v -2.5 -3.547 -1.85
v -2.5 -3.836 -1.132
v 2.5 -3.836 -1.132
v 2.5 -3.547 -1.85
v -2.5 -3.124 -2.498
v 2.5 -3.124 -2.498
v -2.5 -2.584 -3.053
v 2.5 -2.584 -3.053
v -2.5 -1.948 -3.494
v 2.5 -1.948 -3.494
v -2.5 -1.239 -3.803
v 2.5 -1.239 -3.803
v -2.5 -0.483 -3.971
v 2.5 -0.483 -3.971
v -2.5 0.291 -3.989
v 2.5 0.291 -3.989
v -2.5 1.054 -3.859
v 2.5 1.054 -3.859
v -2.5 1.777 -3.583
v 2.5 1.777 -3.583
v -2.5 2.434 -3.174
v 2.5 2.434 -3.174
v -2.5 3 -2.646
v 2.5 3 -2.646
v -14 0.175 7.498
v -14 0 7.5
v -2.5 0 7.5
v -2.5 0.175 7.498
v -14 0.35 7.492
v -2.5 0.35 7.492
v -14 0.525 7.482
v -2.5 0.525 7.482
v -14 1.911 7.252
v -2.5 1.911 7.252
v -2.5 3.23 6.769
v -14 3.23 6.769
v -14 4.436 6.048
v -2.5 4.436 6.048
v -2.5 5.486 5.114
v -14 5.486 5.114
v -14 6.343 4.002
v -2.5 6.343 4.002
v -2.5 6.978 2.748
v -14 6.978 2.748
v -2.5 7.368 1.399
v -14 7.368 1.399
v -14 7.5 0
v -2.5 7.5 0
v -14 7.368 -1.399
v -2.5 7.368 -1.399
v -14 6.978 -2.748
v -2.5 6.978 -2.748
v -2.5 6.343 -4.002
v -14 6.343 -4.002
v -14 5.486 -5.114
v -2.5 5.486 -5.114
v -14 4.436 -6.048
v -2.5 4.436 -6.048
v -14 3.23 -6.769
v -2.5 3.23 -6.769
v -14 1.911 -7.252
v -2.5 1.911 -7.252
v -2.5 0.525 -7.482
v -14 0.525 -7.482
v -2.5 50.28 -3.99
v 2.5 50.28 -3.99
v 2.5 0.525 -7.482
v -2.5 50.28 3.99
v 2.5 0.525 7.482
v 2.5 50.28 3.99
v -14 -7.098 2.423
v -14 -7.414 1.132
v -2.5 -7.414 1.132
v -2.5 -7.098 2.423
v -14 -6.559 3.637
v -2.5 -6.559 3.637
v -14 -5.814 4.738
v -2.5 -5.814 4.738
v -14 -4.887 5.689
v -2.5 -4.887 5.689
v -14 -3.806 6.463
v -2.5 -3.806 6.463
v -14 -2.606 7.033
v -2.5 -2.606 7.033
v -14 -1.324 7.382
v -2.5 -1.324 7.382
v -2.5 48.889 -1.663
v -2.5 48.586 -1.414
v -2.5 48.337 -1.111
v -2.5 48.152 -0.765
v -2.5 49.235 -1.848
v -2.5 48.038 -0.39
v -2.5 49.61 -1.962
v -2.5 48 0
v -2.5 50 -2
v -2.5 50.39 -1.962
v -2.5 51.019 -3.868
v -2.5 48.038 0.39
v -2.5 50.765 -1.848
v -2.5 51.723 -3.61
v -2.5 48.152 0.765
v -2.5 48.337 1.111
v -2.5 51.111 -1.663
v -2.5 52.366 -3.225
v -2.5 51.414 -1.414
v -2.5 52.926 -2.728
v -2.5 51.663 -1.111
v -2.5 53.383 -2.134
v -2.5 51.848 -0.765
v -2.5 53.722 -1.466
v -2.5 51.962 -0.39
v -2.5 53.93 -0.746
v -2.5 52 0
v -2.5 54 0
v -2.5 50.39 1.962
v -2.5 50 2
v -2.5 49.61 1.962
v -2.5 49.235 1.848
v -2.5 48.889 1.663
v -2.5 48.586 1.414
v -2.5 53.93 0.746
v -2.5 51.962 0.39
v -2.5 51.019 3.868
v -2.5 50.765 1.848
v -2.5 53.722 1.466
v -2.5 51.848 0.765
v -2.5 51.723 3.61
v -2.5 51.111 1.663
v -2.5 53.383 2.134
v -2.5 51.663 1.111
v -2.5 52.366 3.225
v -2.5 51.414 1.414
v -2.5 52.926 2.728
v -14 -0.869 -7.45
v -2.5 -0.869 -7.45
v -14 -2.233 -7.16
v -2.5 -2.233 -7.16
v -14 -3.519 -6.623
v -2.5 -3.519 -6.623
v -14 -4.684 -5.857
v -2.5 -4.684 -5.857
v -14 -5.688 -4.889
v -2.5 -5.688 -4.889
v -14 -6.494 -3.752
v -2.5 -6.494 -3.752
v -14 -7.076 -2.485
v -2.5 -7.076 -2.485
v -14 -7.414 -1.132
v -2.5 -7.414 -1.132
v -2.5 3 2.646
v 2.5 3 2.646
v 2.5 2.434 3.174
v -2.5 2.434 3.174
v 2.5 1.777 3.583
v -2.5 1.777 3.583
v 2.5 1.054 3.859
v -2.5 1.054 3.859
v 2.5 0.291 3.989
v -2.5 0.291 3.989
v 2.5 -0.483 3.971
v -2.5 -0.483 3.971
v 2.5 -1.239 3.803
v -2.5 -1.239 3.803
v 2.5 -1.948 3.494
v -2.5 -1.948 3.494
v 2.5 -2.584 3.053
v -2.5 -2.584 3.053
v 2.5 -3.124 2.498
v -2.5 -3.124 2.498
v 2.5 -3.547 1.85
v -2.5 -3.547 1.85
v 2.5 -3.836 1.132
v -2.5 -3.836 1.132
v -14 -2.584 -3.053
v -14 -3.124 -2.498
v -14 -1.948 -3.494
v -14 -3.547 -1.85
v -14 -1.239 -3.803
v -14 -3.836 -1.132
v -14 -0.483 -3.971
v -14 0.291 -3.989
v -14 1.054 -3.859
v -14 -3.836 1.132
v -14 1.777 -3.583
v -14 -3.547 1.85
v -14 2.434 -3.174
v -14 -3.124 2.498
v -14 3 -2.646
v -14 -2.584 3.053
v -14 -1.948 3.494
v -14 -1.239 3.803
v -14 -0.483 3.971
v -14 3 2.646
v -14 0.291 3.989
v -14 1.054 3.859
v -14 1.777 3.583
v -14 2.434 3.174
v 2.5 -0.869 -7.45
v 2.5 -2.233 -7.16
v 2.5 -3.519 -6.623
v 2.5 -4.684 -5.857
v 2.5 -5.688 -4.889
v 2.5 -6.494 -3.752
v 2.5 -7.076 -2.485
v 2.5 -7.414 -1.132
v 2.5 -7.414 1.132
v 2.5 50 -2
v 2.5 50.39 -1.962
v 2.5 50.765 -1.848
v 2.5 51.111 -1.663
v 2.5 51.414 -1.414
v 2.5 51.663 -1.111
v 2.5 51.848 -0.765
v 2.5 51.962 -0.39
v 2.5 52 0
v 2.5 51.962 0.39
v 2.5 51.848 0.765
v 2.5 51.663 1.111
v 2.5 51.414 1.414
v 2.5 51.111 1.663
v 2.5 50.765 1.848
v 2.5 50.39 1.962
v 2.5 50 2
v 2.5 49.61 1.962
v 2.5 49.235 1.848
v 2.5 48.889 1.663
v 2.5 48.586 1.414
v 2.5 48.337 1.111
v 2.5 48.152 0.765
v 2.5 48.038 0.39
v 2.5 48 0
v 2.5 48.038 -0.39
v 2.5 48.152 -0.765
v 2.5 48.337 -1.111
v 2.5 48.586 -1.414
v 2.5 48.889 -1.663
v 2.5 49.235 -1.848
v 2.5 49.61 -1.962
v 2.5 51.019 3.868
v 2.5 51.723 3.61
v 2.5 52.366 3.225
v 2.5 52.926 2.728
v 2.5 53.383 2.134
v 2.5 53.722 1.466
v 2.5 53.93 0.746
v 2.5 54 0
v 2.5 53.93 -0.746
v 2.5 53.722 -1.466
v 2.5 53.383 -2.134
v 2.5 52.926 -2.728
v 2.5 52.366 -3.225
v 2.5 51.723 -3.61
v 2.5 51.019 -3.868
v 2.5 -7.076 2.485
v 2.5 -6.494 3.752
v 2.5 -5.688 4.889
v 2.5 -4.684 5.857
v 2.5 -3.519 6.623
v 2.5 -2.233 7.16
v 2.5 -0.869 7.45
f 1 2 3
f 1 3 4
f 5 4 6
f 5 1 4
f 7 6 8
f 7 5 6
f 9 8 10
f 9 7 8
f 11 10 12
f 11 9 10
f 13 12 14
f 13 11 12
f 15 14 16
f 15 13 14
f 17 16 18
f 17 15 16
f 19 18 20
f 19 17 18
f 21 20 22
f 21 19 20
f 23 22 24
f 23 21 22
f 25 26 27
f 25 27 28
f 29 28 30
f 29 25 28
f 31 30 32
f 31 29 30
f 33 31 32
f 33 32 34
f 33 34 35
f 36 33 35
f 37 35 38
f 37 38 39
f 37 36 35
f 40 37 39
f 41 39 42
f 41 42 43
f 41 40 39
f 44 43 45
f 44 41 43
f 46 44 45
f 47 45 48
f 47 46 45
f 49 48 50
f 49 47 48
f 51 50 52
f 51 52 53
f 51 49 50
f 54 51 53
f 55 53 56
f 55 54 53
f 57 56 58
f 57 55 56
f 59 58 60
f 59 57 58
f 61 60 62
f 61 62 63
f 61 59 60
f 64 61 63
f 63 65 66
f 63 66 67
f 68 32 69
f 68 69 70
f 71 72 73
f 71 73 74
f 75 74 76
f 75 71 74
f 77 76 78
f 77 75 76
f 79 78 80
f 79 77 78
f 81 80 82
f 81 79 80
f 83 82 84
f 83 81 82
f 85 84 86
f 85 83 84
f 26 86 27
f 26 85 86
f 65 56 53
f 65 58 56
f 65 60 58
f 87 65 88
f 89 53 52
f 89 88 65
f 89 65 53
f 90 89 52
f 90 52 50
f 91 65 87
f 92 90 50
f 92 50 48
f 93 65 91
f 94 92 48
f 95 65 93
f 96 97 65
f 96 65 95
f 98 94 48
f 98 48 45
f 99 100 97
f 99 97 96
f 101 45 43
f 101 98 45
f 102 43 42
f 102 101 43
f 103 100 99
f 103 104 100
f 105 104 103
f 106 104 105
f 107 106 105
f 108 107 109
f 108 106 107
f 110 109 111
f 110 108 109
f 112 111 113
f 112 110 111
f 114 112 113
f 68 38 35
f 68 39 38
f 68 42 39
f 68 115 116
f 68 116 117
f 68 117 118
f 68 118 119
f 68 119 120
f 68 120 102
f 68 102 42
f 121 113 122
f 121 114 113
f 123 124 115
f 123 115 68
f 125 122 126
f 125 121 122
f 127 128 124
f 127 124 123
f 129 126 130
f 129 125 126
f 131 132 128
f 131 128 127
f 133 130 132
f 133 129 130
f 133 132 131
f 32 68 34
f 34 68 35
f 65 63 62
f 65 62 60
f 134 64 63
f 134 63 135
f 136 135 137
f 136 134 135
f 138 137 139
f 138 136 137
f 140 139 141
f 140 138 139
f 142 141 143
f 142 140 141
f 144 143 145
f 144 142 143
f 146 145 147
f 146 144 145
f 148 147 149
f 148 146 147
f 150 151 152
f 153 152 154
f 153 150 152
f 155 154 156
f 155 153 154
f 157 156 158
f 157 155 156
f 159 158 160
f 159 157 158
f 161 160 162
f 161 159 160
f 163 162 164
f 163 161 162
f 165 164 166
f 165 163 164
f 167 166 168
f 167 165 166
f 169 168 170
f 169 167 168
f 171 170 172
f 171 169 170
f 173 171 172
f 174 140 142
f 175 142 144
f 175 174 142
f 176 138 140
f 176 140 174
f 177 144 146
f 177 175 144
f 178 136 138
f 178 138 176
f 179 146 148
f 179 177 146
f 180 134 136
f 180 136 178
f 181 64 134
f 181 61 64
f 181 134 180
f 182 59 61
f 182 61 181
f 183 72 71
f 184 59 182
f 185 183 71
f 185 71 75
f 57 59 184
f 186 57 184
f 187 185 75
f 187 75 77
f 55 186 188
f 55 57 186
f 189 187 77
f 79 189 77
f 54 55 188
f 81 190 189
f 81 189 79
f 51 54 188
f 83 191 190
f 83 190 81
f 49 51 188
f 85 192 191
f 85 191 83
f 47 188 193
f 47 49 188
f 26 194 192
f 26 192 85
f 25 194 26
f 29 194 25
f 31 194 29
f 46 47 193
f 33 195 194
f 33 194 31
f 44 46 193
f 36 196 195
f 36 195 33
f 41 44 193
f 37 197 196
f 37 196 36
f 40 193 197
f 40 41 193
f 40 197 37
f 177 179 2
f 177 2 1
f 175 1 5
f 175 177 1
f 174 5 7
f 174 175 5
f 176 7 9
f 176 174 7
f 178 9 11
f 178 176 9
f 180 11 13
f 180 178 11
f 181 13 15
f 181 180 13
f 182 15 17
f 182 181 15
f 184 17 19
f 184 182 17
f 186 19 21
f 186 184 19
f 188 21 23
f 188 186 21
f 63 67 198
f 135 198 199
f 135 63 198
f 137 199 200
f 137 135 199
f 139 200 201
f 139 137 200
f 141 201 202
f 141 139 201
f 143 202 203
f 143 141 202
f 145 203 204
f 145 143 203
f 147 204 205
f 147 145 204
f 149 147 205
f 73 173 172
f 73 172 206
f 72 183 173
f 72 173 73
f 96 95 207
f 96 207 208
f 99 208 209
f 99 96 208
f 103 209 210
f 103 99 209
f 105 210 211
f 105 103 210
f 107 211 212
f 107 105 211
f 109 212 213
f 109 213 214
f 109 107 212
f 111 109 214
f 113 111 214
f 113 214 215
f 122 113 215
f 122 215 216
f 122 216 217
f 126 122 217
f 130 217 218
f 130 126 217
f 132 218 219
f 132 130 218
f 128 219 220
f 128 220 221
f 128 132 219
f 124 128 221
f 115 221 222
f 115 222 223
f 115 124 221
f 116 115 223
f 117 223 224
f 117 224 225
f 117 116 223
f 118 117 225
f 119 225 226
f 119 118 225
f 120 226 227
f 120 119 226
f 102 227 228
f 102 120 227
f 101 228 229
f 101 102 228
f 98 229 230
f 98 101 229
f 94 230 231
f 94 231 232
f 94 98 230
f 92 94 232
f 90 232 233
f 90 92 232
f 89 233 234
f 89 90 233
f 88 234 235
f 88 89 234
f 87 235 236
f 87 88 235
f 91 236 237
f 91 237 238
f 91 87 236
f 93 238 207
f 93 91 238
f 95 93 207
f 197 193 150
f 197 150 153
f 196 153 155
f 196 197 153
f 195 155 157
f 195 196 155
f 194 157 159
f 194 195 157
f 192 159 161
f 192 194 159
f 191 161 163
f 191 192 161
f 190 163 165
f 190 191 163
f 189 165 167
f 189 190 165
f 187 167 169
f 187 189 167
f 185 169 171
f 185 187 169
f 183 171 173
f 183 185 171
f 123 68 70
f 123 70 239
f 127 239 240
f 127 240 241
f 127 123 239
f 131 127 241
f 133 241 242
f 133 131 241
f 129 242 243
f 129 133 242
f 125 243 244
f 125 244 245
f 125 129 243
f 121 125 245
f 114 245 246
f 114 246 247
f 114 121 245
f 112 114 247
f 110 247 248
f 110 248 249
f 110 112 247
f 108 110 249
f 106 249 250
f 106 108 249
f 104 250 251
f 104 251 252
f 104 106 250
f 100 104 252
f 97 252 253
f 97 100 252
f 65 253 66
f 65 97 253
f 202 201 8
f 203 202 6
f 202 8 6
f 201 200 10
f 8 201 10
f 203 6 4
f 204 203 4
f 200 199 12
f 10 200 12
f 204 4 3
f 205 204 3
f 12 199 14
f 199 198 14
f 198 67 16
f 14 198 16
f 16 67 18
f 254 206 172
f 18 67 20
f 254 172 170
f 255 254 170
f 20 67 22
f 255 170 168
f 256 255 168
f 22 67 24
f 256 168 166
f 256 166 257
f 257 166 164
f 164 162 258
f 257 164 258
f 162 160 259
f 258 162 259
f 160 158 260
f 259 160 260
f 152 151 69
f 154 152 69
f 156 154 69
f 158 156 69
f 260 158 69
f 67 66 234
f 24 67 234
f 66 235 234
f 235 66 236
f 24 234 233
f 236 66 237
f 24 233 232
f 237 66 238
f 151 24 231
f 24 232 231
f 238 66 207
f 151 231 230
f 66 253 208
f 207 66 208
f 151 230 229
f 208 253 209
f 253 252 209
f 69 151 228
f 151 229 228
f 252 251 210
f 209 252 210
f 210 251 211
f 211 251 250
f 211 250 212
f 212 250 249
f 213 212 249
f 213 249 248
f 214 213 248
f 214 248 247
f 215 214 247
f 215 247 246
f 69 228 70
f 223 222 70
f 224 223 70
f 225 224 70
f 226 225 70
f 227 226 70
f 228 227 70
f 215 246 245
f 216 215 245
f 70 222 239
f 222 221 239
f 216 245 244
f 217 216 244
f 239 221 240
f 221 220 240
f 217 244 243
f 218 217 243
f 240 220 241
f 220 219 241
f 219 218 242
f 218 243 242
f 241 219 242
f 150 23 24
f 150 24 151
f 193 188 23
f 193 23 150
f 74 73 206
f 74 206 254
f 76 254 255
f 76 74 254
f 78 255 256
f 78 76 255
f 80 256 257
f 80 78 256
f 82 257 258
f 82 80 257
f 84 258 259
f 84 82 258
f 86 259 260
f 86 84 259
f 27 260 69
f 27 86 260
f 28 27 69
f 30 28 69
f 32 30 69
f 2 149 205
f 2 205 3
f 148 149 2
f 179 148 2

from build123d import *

# Parameters (mm, degrees)
BOSS_EXTRUDE1_DEPTH      = 2.5
BOSS_EXTRUDE1_DEPTH_BACK = 2.5
SKETCH2_R                = 2
CUT_EXTRUDE1_REACH       = 56.747
SKETCH3_W                = 2.263959938
SKETCH3_H                = 7.327028906
BOSS_EXTRUDE2_START      = 11.5
BOSS_EXTRUDE2_DEPTH      = 11.5


with BuildPart() as part:
    # Sketch2 → Boss-Extrude1 (new, two sides: drawn at the far end of the back side and taken through both)
    with BuildSketch(Plane(origin=(0, 0, 0), x_dir=(0, 0, -1), z_dir=(1, 0, 0)).offset(-BOSS_EXTRUDE1_DEPTH_BACK)):
        with BuildLine():
            Line((3.990187965, 50.28), (7.481602435, 0.525))
            ThreePointArc((7.481602435, 0.525), (0, -7.5), (-7.481602435, 0.525))
            Line((-7.481602435, 0.525), (-3.990187965, 50.28))
            ThreePointArc((-3.990187965, 50.28), (0, 54), (3.990187965, 50.28))
        make_face()
        with Locations((0, 50)):
            Circle(SKETCH2_R, mode=Mode.SUBTRACT)
        with BuildLine():
            ThreePointArc((-2.645751311, 3), (0, -4), (2.645751311, 3))
            Line((2.645751311, 3), (-2.645751311, 3))
        make_face(mode=Mode.SUBTRACT)
    extrude(amount=BOSS_EXTRUDE1_DEPTH + BOSS_EXTRUDE1_DEPTH_BACK)

    # Sketch3 → Cut-Extrude1 (cut, up to next)
    with BuildSketch(Plane(origin=(2.5, 0, 0), x_dir=(0, 0, -1), z_dir=(1, 0, 0)), mode=Mode.PRIVATE) as cut_extrude1_sk1:
        with Locations((0, -7.5)):
            Rectangle(SKETCH3_W, SKETCH3_H)
    cut_extrude1_tool1 = extrude(cut_extrude1_sk1.sketch, amount=-CUT_EXTRUDE1_REACH, mode=Mode.PRIVATE) & part.part
    add(cut_extrude1_tool1.solids().sort_by_distance((2.5, -7.5, 0))[0], mode=Mode.SUBTRACT)

    # Sketch5 → Boss-Extrude2 (add)
    with BuildSketch(Plane.ZY.offset(2.5).offset(BOSS_EXTRUDE2_START)):
        with BuildLine():
            ThreePointArc((-7.481602435, 0.525), (-5.85710754, -4.684473424), (-1.131979969, -7.414082637))
            Line((-1.131979969, -7.414082637), (-1.131979969, -3.836485547))
            ThreePointArc((-1.131979969, -3.836485547), (-3.905406133, -0.864755998), (-2.645751311, 3))
            Line((-2.645751311, 3), (2.645751311, 3))
            ThreePointArc((2.645751311, 3), (3.905406133, -0.864755998), (1.131979969, -3.836485547))
            Line((1.131979969, -3.836485547), (1.131979969, -7.414082637))
            ThreePointArc((1.131979969, -7.414082637), (5.689457345, -4.886724375), (7.5, 0))
            ThreePointArc((7.5, 0), (7.495399198, 0.262661127), (7.481602435, 0.525))
            ThreePointArc((7.481602435, 0.525), (0, 7.5), (-7.481602435, 0.525))
        make_face()
    extrude(amount=-BOSS_EXTRUDE2_DEPTH)


solid = part.part
